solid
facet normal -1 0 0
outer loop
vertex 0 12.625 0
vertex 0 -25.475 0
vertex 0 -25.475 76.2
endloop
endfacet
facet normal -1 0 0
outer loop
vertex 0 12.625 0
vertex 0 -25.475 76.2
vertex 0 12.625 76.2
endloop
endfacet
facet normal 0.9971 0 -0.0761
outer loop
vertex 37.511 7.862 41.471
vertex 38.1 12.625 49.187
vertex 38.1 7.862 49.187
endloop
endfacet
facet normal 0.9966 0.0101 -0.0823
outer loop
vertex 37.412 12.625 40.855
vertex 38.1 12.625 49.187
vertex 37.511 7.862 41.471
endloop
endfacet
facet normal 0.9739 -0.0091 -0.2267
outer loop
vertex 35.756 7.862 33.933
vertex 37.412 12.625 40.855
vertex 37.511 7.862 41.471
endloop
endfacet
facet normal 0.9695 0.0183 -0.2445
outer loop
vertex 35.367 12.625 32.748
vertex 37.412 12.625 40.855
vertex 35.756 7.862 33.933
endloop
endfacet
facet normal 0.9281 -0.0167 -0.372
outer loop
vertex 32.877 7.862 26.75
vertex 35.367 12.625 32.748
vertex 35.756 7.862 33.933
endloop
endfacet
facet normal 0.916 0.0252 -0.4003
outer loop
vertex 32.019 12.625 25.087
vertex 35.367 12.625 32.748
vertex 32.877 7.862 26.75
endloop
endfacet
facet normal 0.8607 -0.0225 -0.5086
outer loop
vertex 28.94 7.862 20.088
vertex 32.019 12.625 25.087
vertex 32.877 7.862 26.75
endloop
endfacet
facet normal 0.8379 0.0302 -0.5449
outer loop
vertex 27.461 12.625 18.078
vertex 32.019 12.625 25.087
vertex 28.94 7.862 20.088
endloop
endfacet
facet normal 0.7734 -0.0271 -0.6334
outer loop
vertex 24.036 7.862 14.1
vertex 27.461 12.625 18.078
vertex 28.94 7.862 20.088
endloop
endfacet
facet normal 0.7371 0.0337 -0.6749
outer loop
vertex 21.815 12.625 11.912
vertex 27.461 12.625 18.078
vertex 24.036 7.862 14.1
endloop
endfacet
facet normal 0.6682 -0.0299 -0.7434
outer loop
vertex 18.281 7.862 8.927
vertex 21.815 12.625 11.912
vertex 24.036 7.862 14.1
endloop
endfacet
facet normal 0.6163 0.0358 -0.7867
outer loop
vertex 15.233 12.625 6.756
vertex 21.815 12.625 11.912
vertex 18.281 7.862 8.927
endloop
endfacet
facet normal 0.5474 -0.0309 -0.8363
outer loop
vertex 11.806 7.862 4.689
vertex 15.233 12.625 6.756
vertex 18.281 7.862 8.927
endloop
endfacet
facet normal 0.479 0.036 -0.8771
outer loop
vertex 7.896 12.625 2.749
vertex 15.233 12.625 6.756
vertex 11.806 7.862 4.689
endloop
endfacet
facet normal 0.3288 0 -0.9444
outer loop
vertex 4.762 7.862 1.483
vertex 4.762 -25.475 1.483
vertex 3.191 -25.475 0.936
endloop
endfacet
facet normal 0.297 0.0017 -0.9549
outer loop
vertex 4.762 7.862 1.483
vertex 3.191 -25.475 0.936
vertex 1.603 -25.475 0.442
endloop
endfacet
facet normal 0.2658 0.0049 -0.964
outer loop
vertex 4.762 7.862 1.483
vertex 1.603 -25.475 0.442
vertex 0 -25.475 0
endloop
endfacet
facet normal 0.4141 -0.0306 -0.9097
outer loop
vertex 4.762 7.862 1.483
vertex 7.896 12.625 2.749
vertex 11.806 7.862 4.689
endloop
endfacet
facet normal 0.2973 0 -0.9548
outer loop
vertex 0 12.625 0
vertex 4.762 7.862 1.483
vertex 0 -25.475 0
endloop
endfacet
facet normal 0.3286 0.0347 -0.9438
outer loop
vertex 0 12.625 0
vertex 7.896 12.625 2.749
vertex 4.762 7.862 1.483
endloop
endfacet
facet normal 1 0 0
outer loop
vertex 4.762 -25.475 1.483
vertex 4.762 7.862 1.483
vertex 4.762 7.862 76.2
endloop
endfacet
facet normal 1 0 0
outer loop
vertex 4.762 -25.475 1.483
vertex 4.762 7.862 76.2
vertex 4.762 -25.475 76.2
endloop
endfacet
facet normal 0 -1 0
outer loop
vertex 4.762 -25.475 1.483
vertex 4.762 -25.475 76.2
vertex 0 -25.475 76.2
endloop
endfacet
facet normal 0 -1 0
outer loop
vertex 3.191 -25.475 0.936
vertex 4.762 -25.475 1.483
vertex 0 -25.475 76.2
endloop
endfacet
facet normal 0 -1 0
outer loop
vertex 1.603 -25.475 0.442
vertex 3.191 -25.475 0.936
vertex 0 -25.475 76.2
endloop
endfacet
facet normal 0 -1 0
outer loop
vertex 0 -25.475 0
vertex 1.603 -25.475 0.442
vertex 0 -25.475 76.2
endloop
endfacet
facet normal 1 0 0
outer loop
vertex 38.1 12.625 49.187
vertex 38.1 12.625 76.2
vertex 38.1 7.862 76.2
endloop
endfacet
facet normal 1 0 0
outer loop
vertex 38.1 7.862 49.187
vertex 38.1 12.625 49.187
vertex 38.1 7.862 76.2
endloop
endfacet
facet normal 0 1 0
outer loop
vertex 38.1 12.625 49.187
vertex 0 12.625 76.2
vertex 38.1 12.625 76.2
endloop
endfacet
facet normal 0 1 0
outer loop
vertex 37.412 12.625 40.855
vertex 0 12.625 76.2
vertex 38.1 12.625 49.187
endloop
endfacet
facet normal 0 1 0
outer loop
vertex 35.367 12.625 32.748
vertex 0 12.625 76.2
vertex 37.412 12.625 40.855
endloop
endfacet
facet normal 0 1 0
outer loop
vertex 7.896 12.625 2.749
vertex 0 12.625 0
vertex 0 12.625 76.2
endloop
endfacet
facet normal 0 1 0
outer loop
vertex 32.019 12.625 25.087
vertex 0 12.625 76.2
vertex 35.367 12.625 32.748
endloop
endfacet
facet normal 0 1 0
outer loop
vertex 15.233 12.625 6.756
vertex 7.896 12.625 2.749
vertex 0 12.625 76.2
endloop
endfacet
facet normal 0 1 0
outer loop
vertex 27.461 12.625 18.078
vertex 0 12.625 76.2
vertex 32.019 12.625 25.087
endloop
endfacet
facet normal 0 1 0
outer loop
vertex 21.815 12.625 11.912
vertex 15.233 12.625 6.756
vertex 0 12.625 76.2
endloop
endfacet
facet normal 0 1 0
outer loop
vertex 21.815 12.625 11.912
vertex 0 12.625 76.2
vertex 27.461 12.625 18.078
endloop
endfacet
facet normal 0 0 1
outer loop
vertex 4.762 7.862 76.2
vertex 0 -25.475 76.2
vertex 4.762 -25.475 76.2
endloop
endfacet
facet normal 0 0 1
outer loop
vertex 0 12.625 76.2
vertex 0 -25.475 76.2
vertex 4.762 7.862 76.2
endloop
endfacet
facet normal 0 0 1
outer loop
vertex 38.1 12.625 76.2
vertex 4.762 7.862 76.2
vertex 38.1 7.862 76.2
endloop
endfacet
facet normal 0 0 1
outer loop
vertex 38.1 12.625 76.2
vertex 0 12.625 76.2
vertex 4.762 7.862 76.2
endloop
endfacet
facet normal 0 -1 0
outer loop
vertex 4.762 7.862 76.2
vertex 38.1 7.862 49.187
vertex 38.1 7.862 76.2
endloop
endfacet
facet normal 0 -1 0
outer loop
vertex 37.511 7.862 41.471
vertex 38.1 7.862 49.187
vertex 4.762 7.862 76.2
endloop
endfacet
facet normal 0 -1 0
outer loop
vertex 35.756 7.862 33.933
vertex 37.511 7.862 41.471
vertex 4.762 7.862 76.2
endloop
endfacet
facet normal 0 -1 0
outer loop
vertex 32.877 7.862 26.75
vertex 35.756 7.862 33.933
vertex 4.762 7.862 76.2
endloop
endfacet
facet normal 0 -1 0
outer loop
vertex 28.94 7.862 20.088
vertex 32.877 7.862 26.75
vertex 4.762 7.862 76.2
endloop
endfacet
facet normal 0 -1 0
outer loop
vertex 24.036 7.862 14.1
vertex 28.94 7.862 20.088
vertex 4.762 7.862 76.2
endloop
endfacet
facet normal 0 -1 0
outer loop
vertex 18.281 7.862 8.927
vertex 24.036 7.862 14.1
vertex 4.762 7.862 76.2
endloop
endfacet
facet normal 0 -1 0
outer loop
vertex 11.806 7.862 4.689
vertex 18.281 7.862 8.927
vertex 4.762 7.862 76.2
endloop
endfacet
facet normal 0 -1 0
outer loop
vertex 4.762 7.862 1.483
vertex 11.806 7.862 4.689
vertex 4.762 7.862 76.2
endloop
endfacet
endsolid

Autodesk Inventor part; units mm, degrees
ref_plane "YZ Plane" through (0, 0, 0) normal (1, 0, 0) x (0, 1, 0)
ref_plane "XZ Plane" through (0, 0, 0) normal (0, 1, 0) x (-1, 0, 0)
ref_plane "XY Plane" through (0, 0, 0) normal (0, 0, 1) x (1, 0, 0)
sketch "Sketch1" plane through (0, 0, 0) normal (0, 0, 1) x (1, 0, 0)
  line L0 (0, 12.6249) -> (38.1, 12.6249)
  line L1 (38.1, 12.6249) -> (38.1, 7.8624)
  line L2 (38.1, 7.8624) -> (4.7625, 7.8624)
  line L3 (4.7625, 7.8624) -> (4.7625, -25.4751)
  line L4 (4.7625, -25.4751) -> (0, -25.4751)
  line L5 (0, -25.4751) -> (0, 12.6249)
  point P0 (0, 0)
  point P1 (0, 0)
  dimension "d0" = 38.1
  dimension "d1" = 4.7625
  dimension "d2" = 4.7625
  dimension "d3" = 38.1
extrude "Extrusion1" add sketch "Sketch1" along normal blind 76.2
fillet "Corner Round1" radius 50.8 1 edges at (38.1, 10.2436, 0)
equation "\"BendRadius\" = Thickness"
equation "\"BendReliefWidth\" = Thickness"
equation "\"BendReliefDepth\" = 0.5 * Thickness"
equation "\"CornerReliefSize\" = 4 * Thickness"
equation "\"MinimumRemnant\" = 2 * Thickness"
equation "\"TransitionRadius\" = BendRadius"
equation "\"JacobiRadiusSize\" = BendRadius"
equation "\"GapSize\" = Thickness"
equation "\"Thickness\" = 4.7625"
properties part number "RearWheelMountLeft" material "Steel, Mild"
